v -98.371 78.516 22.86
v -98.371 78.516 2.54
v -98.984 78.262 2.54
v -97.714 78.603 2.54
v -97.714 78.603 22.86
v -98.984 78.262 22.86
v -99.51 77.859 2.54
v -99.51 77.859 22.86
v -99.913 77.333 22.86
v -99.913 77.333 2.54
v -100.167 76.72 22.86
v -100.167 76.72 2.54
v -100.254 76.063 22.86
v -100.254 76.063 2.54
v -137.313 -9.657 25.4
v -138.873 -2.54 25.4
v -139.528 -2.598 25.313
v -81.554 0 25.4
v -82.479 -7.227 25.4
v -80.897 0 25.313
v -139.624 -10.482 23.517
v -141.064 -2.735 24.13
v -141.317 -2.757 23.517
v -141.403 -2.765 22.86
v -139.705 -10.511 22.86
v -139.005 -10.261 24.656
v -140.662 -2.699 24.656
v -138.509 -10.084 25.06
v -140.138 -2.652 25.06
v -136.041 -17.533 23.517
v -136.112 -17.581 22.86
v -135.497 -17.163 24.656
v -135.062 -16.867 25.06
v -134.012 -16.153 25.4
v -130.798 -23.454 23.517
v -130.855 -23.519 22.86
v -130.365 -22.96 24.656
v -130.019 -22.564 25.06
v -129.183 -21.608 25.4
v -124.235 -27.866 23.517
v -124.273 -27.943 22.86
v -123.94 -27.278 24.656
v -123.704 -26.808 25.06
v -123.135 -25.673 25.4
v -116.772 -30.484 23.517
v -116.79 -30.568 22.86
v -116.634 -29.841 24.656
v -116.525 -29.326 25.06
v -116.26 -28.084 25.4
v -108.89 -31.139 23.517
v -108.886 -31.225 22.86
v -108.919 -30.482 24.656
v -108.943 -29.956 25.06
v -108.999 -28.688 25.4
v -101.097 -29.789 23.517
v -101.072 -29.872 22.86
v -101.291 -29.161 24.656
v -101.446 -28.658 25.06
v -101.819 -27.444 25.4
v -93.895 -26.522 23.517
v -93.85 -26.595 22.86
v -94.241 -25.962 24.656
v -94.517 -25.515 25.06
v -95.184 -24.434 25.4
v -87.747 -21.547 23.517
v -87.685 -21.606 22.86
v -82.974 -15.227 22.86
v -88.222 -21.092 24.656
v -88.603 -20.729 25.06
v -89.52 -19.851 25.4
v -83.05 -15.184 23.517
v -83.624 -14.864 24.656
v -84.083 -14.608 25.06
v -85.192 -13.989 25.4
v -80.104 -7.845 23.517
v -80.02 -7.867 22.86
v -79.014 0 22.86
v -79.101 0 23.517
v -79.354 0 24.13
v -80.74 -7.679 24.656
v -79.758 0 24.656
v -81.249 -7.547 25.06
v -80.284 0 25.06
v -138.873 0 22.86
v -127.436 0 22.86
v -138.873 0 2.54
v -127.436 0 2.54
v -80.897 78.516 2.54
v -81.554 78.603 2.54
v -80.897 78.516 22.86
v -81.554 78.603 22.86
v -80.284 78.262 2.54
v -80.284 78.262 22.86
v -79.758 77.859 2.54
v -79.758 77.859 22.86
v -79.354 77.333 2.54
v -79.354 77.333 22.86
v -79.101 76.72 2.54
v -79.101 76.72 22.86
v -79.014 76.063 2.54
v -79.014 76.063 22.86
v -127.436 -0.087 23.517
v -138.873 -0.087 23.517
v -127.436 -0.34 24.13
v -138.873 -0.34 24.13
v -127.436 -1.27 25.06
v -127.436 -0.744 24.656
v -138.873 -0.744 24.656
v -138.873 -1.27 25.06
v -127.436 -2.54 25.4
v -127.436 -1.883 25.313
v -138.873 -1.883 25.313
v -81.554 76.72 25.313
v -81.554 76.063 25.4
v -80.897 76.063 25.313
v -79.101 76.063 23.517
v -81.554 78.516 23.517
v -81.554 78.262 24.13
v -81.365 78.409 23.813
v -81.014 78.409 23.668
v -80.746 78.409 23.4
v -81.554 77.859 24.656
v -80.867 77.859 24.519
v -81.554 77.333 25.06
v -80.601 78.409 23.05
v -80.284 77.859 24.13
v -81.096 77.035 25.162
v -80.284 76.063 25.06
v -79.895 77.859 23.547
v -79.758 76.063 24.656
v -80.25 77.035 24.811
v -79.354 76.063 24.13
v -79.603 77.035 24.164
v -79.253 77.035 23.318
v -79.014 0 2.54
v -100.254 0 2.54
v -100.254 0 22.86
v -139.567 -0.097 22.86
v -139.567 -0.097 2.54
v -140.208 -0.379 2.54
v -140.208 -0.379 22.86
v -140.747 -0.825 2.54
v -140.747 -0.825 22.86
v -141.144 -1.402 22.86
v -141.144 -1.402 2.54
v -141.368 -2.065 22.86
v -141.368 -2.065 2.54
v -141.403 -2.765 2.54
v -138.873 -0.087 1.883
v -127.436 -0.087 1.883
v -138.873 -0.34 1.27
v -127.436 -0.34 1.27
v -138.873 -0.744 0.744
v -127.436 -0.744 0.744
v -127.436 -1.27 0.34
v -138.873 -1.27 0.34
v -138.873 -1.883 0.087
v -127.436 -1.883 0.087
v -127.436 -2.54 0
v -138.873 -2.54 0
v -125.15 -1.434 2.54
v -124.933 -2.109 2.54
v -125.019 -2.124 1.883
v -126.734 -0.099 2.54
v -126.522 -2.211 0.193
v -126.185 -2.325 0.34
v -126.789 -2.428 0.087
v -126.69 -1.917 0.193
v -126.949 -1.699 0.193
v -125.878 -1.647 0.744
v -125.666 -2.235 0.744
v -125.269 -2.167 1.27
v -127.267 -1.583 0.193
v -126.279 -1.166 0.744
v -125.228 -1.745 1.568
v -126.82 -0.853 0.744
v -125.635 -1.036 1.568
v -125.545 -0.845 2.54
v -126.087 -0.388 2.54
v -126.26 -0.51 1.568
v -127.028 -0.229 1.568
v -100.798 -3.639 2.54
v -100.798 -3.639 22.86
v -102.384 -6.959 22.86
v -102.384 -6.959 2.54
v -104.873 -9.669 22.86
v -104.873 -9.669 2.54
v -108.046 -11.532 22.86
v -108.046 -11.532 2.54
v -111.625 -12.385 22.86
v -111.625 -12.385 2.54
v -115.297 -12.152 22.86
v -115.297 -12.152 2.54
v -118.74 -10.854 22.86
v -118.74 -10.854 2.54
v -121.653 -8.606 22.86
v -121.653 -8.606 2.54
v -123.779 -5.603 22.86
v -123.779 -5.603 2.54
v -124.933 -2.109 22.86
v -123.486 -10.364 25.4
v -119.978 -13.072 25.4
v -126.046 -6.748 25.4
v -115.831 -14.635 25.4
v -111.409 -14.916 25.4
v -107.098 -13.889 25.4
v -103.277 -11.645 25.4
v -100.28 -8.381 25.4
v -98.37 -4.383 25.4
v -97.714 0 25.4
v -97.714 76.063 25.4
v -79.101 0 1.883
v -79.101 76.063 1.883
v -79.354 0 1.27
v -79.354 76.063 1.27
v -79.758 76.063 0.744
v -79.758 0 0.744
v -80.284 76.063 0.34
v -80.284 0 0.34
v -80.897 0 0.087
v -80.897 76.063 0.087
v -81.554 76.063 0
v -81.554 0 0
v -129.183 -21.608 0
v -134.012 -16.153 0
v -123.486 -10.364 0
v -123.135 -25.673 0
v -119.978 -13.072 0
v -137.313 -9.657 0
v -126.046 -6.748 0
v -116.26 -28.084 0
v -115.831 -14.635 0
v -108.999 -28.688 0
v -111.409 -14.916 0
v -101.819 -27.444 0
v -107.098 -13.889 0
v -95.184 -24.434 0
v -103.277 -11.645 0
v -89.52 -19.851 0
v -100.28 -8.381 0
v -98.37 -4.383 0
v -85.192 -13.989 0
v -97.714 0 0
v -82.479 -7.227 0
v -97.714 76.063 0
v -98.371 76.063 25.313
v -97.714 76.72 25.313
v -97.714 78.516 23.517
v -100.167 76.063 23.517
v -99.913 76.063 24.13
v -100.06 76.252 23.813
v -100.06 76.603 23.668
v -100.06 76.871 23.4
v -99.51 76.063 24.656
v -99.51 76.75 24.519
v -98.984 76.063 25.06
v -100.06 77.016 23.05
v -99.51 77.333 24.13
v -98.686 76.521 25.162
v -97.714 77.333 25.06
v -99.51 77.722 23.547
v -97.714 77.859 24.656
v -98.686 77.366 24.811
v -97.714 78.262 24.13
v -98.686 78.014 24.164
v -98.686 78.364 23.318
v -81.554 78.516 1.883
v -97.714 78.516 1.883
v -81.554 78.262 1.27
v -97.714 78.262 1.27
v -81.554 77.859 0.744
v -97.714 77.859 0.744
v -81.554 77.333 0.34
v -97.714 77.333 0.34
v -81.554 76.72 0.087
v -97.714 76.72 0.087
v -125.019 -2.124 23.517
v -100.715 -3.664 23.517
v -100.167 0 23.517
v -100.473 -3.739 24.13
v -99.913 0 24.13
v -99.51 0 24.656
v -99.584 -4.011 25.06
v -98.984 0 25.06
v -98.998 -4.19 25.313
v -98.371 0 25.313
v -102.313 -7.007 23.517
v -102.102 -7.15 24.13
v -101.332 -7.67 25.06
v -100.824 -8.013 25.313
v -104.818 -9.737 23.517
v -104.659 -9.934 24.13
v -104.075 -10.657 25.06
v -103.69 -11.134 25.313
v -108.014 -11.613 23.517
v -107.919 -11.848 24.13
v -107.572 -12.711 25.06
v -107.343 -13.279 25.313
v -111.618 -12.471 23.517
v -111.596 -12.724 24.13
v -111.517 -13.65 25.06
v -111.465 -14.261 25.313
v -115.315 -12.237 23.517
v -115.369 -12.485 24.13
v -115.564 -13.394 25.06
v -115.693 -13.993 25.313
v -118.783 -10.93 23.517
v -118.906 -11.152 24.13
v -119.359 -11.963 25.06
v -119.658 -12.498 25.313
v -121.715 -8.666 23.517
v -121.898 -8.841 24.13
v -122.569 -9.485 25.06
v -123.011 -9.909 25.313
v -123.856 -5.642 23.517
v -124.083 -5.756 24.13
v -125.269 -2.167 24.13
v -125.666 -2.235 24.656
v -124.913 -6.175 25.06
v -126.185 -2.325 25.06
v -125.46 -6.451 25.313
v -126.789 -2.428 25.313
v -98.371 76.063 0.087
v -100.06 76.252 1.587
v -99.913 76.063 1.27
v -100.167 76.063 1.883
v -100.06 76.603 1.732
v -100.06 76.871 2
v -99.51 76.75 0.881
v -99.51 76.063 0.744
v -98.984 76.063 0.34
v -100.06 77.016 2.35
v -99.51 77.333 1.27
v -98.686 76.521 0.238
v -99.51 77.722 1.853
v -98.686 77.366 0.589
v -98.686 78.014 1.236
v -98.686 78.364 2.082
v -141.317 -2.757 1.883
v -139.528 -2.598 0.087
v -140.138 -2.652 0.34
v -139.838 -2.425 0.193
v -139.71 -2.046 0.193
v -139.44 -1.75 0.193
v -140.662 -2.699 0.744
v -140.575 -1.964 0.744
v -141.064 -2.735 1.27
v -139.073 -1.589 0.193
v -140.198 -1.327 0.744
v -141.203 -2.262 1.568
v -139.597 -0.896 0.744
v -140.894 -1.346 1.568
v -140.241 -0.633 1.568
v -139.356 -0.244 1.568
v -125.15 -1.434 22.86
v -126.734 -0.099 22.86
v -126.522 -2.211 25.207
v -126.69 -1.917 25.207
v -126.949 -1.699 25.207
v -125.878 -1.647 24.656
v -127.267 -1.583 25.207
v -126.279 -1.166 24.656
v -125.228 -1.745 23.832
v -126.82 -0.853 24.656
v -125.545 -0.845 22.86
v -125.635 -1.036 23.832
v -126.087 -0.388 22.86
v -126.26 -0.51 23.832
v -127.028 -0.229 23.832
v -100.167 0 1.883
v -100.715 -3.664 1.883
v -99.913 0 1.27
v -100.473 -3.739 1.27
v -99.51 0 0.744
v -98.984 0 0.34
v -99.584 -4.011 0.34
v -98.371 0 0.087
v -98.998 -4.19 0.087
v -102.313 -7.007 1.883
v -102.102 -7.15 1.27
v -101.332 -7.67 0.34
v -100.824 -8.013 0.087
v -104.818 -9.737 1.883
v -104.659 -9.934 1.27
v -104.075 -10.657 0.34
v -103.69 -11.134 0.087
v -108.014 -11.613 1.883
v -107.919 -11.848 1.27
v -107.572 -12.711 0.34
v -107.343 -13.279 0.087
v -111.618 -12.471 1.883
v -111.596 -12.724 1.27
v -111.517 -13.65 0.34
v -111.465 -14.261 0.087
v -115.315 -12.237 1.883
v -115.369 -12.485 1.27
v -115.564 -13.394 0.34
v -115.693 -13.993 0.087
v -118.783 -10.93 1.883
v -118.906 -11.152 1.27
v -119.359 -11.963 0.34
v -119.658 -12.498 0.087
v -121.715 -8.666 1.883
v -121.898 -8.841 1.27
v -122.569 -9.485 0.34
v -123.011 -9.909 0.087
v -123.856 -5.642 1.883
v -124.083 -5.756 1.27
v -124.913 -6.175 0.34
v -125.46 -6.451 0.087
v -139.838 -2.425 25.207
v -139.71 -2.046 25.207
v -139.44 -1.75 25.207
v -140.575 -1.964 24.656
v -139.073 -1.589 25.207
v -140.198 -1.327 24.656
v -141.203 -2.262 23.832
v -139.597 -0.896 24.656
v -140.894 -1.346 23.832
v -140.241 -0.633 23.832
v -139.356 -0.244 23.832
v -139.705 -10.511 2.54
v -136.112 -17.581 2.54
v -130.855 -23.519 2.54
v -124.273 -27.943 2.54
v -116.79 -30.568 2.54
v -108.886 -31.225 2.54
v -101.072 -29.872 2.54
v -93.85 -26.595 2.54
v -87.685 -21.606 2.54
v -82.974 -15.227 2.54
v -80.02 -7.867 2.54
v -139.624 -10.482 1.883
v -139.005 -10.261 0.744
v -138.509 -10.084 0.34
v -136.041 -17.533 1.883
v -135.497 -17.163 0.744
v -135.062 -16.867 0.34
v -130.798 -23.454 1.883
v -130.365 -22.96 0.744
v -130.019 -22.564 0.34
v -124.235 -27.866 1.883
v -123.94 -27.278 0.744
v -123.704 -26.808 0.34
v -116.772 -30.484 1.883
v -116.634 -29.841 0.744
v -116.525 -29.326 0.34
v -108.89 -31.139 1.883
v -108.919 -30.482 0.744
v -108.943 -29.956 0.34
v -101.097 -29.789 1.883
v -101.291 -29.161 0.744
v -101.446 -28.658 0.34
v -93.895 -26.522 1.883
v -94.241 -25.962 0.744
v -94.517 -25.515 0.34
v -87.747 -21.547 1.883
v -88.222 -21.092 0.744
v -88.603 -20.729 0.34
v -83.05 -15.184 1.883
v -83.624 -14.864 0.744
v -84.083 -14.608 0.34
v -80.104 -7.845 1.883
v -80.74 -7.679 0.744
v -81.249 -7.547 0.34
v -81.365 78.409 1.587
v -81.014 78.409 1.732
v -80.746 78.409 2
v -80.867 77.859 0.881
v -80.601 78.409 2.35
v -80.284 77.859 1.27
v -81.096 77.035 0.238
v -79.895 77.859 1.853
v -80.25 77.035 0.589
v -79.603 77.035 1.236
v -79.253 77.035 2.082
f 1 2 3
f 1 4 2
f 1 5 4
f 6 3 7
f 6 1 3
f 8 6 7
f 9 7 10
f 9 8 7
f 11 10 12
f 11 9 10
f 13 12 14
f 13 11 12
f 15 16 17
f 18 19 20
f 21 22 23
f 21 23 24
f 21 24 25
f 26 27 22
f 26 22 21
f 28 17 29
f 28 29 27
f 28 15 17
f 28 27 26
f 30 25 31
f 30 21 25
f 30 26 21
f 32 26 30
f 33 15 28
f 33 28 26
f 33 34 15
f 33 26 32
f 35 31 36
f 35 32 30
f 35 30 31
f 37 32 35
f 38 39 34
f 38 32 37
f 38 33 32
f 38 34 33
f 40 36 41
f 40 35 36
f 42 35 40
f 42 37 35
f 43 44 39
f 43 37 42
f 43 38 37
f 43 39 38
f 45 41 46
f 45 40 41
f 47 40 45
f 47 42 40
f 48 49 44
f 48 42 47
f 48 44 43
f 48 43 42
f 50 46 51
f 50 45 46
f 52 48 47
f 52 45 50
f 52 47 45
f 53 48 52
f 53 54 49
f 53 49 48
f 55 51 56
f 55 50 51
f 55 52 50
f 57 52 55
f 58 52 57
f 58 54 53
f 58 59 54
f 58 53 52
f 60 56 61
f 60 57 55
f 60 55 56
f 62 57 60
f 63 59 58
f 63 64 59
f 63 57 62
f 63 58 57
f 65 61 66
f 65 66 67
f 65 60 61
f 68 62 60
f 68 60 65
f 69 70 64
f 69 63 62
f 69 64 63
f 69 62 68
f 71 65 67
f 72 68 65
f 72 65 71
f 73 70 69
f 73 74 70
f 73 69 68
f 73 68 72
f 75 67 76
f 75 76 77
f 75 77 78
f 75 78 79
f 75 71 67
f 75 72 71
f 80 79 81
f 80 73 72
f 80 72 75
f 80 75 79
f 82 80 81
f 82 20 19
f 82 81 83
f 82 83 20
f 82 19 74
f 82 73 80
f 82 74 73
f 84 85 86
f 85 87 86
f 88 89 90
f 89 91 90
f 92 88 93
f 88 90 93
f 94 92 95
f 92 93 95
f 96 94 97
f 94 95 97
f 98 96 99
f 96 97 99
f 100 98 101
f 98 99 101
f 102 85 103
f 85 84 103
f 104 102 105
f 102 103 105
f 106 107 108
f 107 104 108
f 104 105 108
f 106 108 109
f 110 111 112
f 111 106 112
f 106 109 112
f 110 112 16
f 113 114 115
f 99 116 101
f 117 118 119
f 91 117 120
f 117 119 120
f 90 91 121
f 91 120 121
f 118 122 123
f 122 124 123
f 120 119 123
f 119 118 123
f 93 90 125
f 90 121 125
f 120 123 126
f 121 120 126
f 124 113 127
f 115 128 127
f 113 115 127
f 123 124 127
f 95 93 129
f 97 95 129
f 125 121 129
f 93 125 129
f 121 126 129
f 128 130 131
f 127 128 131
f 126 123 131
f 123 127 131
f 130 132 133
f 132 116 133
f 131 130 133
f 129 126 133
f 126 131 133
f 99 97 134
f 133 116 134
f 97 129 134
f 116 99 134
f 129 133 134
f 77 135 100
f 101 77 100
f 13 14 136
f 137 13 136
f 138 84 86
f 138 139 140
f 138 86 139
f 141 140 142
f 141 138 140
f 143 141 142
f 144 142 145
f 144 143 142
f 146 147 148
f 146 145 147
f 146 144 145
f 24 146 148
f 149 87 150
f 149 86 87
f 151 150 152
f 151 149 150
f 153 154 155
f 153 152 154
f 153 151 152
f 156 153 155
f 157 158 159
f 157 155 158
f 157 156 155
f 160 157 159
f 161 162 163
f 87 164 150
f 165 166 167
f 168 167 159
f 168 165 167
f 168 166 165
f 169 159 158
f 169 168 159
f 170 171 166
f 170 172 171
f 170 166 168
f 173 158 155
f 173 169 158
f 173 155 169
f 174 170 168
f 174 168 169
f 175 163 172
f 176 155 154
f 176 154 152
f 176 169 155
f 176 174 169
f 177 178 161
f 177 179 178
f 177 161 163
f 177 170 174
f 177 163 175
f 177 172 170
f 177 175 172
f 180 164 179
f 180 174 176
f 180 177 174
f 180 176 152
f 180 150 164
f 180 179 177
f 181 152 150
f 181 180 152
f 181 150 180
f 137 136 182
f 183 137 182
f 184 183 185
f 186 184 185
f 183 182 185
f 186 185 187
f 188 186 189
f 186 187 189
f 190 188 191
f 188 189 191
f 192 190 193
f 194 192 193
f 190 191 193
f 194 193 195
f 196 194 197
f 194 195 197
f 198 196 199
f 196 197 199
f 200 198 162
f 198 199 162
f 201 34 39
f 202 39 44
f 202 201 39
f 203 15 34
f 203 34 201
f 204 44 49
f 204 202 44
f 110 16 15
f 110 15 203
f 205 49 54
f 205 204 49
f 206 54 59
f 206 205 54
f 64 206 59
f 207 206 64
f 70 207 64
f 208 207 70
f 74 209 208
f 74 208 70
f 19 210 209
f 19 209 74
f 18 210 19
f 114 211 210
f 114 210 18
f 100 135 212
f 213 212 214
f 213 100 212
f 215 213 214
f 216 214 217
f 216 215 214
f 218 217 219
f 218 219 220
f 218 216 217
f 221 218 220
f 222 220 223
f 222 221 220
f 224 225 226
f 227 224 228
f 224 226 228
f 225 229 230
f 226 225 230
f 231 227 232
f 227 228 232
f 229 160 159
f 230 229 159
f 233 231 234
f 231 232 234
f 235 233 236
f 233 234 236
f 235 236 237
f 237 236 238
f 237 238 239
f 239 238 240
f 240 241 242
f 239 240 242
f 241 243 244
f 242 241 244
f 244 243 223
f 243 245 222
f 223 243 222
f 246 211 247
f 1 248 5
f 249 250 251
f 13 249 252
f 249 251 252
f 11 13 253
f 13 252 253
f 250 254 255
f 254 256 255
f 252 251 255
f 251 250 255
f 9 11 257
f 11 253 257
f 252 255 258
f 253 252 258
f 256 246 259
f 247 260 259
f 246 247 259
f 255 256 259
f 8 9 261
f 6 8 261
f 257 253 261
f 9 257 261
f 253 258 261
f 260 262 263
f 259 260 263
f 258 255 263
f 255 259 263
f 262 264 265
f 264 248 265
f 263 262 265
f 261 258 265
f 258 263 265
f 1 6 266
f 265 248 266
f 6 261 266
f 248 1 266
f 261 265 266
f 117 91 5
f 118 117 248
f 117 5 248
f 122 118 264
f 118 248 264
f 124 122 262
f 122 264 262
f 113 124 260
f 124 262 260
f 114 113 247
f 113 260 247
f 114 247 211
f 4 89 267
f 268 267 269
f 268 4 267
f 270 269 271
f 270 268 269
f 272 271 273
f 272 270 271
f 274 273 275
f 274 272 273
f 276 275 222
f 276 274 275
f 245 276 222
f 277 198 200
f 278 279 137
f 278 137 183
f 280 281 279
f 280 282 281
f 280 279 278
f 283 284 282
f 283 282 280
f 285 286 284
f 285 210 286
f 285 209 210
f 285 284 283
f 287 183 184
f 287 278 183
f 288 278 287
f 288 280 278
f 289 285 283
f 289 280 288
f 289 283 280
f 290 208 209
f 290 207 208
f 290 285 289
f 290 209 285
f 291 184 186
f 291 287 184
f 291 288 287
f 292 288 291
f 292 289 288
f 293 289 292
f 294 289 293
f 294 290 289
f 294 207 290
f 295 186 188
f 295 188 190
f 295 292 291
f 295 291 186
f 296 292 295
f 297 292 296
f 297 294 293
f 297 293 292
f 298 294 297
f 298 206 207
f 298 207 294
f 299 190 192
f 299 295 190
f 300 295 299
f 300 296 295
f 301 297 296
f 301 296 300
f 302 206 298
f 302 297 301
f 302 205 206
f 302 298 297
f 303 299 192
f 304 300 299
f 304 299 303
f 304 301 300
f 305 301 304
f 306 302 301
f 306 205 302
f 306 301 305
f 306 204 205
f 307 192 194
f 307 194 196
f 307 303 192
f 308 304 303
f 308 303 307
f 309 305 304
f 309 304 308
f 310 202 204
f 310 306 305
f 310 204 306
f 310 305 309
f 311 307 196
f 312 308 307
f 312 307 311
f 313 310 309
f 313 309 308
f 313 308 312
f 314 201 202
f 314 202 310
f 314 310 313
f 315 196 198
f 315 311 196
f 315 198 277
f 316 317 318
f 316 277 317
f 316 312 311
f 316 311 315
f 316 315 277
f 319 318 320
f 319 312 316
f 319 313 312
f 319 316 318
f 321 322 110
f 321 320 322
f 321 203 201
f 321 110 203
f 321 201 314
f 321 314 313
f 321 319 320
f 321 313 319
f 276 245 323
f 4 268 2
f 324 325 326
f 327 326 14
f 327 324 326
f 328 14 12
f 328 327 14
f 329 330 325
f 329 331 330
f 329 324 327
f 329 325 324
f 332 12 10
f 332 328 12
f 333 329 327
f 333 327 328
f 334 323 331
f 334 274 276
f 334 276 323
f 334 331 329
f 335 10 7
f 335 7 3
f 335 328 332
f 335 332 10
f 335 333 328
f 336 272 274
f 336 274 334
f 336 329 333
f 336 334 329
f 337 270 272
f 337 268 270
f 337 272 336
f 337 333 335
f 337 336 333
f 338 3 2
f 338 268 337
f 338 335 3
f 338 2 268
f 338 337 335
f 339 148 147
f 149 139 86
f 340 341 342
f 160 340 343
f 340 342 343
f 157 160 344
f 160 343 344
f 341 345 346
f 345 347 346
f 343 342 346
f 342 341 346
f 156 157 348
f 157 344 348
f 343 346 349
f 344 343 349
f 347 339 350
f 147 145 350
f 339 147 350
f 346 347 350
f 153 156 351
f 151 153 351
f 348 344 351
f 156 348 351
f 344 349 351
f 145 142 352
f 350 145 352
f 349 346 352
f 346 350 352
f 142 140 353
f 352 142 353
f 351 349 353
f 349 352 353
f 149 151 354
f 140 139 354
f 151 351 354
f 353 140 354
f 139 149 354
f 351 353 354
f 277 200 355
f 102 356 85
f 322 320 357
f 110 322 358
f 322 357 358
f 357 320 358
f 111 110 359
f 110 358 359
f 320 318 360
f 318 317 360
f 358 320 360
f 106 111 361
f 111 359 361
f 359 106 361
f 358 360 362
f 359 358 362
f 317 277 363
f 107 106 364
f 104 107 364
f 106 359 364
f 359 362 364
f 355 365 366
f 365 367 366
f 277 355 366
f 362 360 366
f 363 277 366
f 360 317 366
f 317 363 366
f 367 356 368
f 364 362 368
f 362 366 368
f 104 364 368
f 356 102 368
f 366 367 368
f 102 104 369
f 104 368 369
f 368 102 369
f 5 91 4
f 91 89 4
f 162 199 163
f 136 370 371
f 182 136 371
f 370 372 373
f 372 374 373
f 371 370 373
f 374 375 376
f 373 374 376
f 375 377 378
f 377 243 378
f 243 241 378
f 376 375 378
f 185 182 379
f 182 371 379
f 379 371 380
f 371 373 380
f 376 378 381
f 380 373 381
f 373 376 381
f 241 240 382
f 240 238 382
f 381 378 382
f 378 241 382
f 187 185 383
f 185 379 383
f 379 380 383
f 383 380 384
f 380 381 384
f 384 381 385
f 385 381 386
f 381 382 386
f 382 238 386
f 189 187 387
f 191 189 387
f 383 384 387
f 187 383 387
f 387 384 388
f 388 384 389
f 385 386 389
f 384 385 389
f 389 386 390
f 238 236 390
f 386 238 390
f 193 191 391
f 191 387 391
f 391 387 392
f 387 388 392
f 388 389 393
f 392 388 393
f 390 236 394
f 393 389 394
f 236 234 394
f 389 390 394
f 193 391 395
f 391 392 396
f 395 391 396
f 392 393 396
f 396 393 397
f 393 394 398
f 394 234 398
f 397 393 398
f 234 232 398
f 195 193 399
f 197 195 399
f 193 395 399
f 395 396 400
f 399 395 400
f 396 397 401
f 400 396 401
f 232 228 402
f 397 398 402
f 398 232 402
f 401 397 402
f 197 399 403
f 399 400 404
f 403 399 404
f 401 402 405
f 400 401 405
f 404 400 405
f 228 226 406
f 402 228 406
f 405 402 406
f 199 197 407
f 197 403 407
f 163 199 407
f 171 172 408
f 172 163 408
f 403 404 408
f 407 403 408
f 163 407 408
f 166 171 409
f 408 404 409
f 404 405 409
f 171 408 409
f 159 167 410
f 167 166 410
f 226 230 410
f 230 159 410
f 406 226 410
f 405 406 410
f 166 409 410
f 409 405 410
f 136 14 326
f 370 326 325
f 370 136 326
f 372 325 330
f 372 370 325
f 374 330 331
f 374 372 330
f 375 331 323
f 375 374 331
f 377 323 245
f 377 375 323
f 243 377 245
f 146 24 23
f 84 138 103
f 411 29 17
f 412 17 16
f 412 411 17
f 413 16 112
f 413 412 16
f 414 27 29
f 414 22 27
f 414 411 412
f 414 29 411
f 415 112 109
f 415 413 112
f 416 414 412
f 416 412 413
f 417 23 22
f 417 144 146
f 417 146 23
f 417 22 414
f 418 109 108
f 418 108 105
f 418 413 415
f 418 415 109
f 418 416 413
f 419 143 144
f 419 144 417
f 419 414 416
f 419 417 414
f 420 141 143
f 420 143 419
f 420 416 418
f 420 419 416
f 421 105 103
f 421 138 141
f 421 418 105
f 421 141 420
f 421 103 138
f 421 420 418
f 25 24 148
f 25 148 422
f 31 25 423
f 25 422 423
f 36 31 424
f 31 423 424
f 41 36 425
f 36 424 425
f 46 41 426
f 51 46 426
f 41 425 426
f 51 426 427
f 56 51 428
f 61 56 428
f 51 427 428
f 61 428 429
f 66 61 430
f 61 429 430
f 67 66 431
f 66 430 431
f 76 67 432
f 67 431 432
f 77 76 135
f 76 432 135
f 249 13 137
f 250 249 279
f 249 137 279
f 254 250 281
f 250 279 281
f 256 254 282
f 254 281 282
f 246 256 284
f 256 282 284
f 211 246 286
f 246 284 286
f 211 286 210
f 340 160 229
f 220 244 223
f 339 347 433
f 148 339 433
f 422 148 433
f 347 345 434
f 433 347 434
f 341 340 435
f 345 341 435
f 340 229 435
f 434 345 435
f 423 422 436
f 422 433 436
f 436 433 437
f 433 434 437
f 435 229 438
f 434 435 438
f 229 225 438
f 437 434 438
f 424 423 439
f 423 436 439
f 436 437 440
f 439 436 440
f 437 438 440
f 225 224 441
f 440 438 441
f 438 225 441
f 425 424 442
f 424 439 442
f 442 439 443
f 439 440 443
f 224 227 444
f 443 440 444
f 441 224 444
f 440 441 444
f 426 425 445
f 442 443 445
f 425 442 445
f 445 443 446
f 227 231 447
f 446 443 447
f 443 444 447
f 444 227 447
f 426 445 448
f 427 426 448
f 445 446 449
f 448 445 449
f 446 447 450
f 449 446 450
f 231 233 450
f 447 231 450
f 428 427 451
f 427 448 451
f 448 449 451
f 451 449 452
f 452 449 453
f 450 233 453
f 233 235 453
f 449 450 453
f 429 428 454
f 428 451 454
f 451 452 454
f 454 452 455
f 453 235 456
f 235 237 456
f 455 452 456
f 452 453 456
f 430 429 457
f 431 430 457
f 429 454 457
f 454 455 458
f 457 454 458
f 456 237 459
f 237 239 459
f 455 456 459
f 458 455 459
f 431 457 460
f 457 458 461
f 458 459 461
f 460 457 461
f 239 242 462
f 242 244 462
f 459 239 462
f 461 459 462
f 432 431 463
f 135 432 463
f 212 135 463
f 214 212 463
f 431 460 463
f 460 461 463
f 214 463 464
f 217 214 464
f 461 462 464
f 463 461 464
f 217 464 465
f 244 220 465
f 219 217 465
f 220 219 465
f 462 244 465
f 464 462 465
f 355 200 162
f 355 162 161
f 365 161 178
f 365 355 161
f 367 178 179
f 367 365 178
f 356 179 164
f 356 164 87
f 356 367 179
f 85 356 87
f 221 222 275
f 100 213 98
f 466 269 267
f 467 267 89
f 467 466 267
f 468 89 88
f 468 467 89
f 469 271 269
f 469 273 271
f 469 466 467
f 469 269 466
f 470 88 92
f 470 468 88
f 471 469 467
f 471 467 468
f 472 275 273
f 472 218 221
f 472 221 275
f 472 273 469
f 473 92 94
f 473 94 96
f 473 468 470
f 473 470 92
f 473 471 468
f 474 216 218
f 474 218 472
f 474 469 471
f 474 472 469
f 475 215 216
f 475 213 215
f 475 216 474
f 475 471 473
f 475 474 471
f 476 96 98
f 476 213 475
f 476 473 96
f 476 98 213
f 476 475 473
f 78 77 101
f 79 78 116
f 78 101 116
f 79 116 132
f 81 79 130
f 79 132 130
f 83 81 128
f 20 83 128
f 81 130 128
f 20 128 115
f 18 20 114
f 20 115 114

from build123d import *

# Parameters (mm, degrees)
F1_DEPTH = 25.4
F2_R     = 2.54


with BuildPart() as f1:
    # F0 (on Top) → F1 (new body)
    with BuildSketch(Plane.XY):
        with BuildLine():
            Line((-79.014186, 78.602763), (-100.253638, 78.602763))
            Line((-100.253638, 78.602763), (-100.253638, 0))
            ThreePointArc((-100.253638, 0), (-112.683548, -12.42991), (-125.113457, 0))
            Line((-125.113457, 0), (-141.525768, 0))
            ThreePointArc((-141.525768, 0), (-110.269977, -31.255791), (-79.014186, 0))
            Line((-79.014186, 0), (-79.014186, 78.602763))
        make_face()
    extrude(amount=F1_DEPTH)

    # F2
    f2_edges = [f1.edges().sort_by_distance(p)[0] for p in [
        (-79.014186, 39.301381, 25.4),
        (-89.633912, 78.602763, 25.4),
        (-100.253638, 39.301381, 25.4),
        (-112.683548, -12.42991, 25.4),
        (-133.319613, 0, 25.4),
        (-110.269977, -31.255791, 25.4),
        (-79.014186, 39.301381, 0),
        (-89.633912, 78.602763, 0),
        (-100.253638, 39.301381, 0),
        (-112.683548, -12.42991, 0),
        (-133.319613, 0, 0),
        (-110.269977, -31.255791, 0),
        (-79.014186, 78.602763, 12.7),
        (-100.253638, 78.602763, 12.7),
        (-125.113457, 0, 12.7),
        (-141.525768, 0, 12.7),
    ]]
    fillet(f2_edges, radius=F2_R)


solid = f1.part
